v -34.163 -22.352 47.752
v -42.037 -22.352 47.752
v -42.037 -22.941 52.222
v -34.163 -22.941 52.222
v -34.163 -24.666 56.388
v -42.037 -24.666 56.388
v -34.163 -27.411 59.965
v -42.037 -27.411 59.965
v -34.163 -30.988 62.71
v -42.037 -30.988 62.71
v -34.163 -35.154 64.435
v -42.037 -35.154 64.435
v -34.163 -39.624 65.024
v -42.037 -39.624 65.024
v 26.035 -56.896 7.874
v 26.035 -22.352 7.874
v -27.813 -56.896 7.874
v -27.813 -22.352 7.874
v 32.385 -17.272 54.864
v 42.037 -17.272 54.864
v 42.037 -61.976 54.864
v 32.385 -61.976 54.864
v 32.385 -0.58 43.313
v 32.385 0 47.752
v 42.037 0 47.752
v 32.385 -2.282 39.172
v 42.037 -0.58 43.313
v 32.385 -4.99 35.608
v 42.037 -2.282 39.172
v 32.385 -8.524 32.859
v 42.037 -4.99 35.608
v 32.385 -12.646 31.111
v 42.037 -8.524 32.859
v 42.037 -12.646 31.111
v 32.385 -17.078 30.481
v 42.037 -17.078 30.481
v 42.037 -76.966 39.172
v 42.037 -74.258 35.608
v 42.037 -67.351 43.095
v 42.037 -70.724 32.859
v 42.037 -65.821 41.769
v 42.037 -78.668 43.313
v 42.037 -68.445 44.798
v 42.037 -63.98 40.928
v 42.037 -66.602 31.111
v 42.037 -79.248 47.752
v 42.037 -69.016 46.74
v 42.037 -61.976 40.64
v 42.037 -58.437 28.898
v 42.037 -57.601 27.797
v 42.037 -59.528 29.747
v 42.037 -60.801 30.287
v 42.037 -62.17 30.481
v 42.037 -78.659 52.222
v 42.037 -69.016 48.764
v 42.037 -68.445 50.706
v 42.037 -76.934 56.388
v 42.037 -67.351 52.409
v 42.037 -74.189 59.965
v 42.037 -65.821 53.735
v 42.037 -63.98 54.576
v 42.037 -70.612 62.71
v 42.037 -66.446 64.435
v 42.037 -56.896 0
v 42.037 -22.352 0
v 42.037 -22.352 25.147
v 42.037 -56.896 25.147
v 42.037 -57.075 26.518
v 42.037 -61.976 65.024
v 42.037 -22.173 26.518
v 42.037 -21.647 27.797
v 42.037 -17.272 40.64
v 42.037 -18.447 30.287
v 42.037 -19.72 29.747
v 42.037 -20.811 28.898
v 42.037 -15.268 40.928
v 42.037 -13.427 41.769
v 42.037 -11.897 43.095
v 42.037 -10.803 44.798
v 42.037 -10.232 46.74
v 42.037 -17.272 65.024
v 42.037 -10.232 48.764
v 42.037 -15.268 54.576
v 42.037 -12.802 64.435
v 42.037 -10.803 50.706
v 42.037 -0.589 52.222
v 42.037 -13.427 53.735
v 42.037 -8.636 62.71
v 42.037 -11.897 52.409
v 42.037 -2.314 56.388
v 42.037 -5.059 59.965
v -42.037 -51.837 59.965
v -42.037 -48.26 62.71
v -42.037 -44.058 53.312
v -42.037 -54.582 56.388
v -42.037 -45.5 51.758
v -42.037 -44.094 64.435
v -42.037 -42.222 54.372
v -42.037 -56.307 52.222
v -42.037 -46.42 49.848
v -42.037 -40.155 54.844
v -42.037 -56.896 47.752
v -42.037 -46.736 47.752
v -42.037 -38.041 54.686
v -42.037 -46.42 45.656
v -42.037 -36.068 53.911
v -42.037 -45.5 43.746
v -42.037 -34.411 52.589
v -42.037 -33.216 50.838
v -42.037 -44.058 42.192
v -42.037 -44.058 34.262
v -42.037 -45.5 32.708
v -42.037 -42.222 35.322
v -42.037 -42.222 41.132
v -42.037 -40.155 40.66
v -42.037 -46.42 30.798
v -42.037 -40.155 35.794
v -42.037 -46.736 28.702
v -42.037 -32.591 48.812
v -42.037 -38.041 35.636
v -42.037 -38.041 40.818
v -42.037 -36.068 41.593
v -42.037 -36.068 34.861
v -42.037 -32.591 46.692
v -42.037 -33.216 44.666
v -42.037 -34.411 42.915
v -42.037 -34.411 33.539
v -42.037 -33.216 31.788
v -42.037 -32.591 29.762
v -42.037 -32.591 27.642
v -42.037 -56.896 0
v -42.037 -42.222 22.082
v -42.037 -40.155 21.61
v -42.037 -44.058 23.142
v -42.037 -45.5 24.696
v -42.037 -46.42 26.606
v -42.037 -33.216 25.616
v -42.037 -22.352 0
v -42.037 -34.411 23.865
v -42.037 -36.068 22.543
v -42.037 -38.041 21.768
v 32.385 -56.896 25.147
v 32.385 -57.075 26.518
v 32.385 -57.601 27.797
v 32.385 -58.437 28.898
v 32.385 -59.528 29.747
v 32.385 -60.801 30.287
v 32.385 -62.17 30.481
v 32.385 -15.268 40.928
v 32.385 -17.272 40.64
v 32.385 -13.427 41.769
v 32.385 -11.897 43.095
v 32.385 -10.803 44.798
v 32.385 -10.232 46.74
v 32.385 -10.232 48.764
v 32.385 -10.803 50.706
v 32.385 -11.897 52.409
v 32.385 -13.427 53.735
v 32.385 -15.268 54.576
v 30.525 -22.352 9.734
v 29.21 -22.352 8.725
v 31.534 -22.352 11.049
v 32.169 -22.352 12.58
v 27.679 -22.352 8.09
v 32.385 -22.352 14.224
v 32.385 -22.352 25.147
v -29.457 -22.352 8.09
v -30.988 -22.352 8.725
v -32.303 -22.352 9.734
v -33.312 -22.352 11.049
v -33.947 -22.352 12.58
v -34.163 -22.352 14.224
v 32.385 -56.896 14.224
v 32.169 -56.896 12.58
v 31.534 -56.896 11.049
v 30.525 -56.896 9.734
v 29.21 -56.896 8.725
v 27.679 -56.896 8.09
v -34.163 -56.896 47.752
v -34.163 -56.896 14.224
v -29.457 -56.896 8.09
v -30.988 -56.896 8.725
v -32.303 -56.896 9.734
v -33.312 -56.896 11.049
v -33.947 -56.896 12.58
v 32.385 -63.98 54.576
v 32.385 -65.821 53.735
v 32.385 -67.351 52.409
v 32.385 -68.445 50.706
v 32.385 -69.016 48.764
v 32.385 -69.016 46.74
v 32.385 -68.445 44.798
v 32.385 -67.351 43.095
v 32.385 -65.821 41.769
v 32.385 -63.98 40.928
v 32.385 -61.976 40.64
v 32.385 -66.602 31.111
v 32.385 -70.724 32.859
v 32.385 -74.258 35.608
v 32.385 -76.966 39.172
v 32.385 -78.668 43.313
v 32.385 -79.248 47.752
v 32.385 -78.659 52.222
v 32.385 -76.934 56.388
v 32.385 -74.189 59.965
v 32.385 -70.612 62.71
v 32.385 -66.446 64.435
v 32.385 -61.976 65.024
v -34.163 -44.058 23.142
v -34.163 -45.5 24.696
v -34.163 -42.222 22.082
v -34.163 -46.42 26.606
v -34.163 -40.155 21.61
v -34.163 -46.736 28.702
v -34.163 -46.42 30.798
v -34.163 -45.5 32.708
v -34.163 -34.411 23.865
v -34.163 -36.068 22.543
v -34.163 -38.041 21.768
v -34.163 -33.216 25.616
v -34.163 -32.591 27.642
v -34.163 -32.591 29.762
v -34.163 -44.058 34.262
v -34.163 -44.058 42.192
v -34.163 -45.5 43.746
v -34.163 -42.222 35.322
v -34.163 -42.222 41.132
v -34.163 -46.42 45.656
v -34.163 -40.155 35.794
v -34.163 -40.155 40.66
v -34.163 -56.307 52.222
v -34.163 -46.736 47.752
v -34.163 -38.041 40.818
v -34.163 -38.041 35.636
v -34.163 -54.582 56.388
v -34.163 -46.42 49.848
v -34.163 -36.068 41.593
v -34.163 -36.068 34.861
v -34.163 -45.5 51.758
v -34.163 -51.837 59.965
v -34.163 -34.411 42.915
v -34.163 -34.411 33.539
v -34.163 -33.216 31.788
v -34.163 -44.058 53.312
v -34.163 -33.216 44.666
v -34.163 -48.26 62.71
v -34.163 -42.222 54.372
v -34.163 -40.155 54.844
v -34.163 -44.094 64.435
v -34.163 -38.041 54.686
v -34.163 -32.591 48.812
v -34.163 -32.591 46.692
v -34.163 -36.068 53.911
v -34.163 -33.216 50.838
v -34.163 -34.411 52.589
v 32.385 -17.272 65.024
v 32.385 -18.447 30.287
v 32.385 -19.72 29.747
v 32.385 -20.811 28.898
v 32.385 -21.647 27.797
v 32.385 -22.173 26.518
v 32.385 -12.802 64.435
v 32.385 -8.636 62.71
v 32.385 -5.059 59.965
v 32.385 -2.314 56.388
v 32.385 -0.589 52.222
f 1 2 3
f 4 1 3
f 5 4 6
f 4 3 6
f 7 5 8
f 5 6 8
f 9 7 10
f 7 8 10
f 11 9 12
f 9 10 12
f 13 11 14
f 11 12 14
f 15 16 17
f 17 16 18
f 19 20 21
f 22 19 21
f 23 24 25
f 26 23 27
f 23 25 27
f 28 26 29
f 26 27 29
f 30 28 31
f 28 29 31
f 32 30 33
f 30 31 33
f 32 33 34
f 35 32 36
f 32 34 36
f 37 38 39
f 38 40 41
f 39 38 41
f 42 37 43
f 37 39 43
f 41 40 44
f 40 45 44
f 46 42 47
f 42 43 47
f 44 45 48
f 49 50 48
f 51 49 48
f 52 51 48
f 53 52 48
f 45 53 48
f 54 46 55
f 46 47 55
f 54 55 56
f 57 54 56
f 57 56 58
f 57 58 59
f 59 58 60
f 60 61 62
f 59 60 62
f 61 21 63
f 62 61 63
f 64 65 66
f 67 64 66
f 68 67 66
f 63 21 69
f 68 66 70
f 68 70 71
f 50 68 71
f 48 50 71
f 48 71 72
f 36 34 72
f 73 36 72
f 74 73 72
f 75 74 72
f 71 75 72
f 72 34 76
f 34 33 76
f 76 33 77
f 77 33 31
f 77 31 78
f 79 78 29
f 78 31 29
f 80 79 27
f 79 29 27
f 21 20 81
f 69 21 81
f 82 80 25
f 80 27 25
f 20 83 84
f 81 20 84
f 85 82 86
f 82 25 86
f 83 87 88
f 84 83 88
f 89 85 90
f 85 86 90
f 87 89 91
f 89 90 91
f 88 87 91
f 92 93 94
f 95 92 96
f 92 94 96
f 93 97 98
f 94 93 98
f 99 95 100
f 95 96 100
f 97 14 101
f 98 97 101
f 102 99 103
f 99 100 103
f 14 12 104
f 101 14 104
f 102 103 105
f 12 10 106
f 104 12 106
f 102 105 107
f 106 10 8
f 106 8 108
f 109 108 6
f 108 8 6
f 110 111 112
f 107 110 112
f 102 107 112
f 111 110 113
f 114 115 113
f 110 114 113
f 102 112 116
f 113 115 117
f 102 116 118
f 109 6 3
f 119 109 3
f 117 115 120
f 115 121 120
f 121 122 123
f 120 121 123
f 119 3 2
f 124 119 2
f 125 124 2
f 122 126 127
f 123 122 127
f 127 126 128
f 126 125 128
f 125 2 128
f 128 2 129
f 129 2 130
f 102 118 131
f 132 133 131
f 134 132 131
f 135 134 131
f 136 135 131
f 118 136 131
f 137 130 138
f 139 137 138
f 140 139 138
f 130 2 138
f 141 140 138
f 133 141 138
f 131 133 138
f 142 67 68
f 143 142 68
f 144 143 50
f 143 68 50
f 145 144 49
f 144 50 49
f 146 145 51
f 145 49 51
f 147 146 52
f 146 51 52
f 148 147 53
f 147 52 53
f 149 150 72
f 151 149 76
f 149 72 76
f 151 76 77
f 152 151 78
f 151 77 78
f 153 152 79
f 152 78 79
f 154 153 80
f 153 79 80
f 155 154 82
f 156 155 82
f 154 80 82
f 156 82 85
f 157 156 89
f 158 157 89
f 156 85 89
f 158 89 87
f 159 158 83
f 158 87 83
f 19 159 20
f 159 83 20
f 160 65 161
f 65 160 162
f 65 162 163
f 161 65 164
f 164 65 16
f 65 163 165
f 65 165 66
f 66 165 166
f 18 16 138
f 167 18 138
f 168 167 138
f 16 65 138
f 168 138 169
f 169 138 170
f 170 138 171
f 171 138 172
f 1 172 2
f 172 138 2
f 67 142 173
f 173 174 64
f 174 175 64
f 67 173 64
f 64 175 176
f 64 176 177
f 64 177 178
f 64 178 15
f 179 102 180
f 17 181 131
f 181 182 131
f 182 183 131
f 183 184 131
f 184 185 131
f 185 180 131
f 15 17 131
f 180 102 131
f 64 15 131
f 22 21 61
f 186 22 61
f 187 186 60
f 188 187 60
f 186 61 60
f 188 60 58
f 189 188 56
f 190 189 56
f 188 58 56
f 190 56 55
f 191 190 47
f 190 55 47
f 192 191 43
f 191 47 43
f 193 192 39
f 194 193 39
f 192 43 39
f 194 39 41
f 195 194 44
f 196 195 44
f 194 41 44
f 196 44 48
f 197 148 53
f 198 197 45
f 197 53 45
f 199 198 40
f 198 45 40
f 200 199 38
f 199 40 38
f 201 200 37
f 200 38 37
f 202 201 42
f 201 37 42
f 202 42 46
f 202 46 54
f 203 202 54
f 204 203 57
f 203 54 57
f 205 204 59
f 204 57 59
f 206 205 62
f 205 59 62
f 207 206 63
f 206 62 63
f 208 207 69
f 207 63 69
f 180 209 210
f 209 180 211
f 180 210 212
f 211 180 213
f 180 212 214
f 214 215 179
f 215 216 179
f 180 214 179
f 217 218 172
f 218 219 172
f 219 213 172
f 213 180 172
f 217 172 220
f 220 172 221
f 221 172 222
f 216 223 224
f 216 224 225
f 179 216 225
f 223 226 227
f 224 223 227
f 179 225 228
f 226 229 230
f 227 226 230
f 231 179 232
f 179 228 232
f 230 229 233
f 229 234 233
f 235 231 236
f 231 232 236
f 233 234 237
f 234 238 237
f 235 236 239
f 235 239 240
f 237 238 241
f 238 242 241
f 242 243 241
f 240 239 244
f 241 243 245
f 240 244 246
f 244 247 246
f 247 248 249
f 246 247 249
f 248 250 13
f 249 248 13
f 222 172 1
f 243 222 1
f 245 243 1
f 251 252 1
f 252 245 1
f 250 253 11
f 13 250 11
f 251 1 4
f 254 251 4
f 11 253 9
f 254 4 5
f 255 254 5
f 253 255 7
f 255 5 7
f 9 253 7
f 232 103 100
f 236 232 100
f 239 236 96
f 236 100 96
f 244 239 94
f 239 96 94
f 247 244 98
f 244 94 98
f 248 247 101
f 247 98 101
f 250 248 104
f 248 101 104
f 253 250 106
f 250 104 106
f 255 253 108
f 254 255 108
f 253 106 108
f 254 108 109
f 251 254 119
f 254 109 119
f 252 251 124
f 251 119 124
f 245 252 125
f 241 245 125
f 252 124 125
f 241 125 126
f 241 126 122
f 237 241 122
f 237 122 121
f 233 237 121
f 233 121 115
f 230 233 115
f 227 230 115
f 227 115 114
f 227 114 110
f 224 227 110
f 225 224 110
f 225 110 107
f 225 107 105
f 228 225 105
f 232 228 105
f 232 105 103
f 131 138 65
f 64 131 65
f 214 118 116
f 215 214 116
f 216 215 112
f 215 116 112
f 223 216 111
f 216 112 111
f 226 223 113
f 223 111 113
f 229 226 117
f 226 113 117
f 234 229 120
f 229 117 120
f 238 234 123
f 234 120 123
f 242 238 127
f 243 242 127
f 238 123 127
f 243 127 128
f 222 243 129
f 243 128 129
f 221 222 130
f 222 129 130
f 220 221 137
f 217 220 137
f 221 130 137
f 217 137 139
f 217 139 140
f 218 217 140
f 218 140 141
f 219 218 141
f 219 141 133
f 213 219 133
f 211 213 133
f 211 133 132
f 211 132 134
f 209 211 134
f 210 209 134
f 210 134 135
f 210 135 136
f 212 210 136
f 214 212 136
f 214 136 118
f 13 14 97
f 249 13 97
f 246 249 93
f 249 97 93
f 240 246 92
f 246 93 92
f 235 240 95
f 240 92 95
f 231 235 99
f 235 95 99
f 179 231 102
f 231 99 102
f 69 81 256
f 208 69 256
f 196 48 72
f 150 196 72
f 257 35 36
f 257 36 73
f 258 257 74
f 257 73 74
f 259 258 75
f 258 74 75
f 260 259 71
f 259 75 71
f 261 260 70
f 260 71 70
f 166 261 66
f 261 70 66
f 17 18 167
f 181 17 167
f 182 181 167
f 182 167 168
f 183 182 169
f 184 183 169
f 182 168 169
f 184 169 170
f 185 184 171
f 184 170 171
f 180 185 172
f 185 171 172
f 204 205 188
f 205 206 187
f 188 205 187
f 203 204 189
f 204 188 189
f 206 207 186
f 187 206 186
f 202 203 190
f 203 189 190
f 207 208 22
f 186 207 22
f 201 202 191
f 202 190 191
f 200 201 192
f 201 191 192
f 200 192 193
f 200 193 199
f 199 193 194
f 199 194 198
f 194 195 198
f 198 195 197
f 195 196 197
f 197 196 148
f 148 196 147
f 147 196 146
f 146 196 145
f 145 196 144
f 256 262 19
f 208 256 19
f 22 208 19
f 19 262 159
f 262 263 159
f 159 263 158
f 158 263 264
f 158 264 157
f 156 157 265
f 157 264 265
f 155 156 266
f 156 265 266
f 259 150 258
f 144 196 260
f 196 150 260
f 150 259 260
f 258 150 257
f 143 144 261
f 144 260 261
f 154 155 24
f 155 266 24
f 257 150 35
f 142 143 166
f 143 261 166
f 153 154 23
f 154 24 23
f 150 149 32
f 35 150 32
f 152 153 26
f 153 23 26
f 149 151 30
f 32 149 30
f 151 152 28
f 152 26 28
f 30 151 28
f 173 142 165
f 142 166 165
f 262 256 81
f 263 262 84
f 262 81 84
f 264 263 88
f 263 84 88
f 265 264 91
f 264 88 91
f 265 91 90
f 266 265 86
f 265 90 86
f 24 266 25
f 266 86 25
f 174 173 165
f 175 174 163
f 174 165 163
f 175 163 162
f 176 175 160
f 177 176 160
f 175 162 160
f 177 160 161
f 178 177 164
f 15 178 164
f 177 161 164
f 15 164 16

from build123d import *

# Parameters (mm, degrees)
F1_DEPTH = 79.248
F3_DEPTH = 67.31
F4_R     = 7.112
F5_DEPTH = 18.796


with BuildPart() as f1:
    # F0 (on Front) → F1 (new body)
    with BuildSketch(Plane.XZ):
        with BuildLine():
            Line((-42.037, 65.024), (-42.037, 0))
            Line((-42.037, 0), (42.037, 0))
            Line((42.037, 0), (42.037, 65.024))
            Line((42.037, 65.024), (32.385, 65.024))
            Line((32.385, 65.024), (32.385, 14.224))
            ThreePointArc((32.385, 14.224), (30.5251280605, 9.7338719395), (26.035, 7.874))
            Line((26.035, 7.874), (-27.813, 7.874))
            ThreePointArc((-27.813, 7.874), (-32.3031280605, 9.7338719395), (-34.163, 14.224))
            Line((-34.163, 14.224), (-34.163, 65.024))
            Line((-34.163, 65.024), (-42.037, 65.024))
        make_face()
    extrude(amount=F1_DEPTH)

    # F2 (on face) → F3 (cut)
    with BuildSketch(Plane.YZ.offset(42.037)):
        with BuildLine():
            ThreePointArc((-62.1700674157, 30.4810903008), (-74.257569859, 35.6076586923), (-79.248, 47.752))
            Line((-79.248, 47.752), (-79.248, 0))
            Line((-79.248, 0), (-56.896, 0))
            Line((-56.896, 0), (-56.896, 25.1474270113))
            ThreePointArc((-56.896, 25.1474270113), (-58.4371622494, 28.8978853564), (-62.1700674157, 30.4810903008))
        make_face()
        with BuildLine():
            Line((-39.624, 54.864), (-61.976, 54.864))
            ThreePointArc((-61.976, 54.864), (-69.088, 47.752), (-61.976, 40.64))
            Line((-61.976, 40.64), (-39.624, 40.64))
            Line((-39.624, 40.64), (-17.272, 40.64))
            ThreePointArc((-17.272, 40.64), (-10.16, 47.752), (-17.272, 54.864))
            Line((-17.272, 54.864), (-39.624, 54.864))
        make_face()
        with BuildLine():
            Line((0, 0), (0, 47.752))
            ThreePointArc((0, 47.752), (-4.990430141, 35.6076586923), (-17.0779325843, 30.4810903008))
            ThreePointArc((-17.0779325843, 30.4810903008), (-20.8108377506, 28.8978853564), (-22.352, 25.1474270113))
            Line((-22.352, 25.1474270113), (-22.352, 0))
            Line((-22.352, 0), (0, 0))
        make_face()
        with BuildLine():
            Line((0, 65.024), (-17.272, 65.024))
            ThreePointArc((-17.272, 65.024), (-5.0588516753, 59.9651483247), (0, 47.752))
            Line((0, 47.752), (0, 65.024))
        make_face()
        with BuildLine():
            ThreePointArc((-79.248, 47.752), (-74.1891483247, 59.9651483247), (-61.976, 65.024))
            Line((-61.976, 65.024), (-79.248, 65.024))
            Line((-79.248, 65.024), (-79.248, 47.752))
        make_face()
    extrude(amount=-F3_DEPTH, mode=Mode.SUBTRACT)

    # F4 (on face) + F1_face (on face) → F5 (cut)
    with BuildSketch(Plane(origin=(-42.037, 0, 0), x_dir=(0, -1, 0), z_dir=(-1, 0, 0))):
        with BuildLine():
            ThreePointArc((22.352, 47.752), (27.4108516753, 59.9651483247), (39.624, 65.024))
            Line((39.624, 65.024), (0, 65.024))
            Line((0, 65.024), (0, 0))
            Line((0, 0), (22.352, 0))
            Line((22.352, 0), (22.352, 47.752))
        make_face()
        with BuildLine():
            ThreePointArc((39.624, 65.024), (51.8371483247, 59.9651483247), (56.896, 47.752))
            Line((56.896, 47.752), (56.896, 0))
            Line((56.896, 0), (79.248, 0))
            Line((79.248, 0), (79.248, 65.024))
            Line((79.248, 65.024), (39.624, 65.024))
        make_face()
        with Locations((39.624, 47.752)):
            Circle(F4_R)
        with Locations((39.624, 28.702)):
            Circle(F4_R)
    with BuildSketch(Plane(origin=(42.037, -39.624, 32.512), x_dir=(0, 1, 0), z_dir=(1, 0, 0))):
        with BuildLine():
            Line((17.272, -32.512), (17.272, -7.3645729887))
            ThreePointArc((17.272, -7.3645729887), (18.8131622494, -3.6141146436), (22.5460674157, -2.0309096992))
            ThreePointArc((22.5460674157, -2.0309096992), (39.6237274227, 15.3370352392), (22.352, 32.512))
            Line((22.352, 32.512), (-22.352, 32.512))
            ThreePointArc((-22.352, 32.512), (-39.6237274227, 15.3370352392), (-22.5460674157, -2.0309096992))
            ThreePointArc((-22.5460674157, -2.0309096992), (-18.8131622494, -3.6141146436), (-17.272, -7.3645729887))
            Line((-17.272, -7.3645729887), (-17.272, -32.512))
            Line((-17.272, -32.512), (17.272, -32.512))
        make_face()
        with BuildLine():
            ThreePointArc((22.352, 22.352), (29.464, 15.24), (22.352, 8.128))
            Line((22.352, 8.128), (-22.352, 8.128))
            ThreePointArc((-22.352, 8.128), (-29.464, 15.24), (-22.352, 22.352))
            Line((-22.352, 22.352), (22.352, 22.352))
        make_face(mode=Mode.SUBTRACT)
    extrude(amount=-F5_DEPTH, dir=(-1, 0, 0), mode=Mode.SUBTRACT)


solid = f1.part
